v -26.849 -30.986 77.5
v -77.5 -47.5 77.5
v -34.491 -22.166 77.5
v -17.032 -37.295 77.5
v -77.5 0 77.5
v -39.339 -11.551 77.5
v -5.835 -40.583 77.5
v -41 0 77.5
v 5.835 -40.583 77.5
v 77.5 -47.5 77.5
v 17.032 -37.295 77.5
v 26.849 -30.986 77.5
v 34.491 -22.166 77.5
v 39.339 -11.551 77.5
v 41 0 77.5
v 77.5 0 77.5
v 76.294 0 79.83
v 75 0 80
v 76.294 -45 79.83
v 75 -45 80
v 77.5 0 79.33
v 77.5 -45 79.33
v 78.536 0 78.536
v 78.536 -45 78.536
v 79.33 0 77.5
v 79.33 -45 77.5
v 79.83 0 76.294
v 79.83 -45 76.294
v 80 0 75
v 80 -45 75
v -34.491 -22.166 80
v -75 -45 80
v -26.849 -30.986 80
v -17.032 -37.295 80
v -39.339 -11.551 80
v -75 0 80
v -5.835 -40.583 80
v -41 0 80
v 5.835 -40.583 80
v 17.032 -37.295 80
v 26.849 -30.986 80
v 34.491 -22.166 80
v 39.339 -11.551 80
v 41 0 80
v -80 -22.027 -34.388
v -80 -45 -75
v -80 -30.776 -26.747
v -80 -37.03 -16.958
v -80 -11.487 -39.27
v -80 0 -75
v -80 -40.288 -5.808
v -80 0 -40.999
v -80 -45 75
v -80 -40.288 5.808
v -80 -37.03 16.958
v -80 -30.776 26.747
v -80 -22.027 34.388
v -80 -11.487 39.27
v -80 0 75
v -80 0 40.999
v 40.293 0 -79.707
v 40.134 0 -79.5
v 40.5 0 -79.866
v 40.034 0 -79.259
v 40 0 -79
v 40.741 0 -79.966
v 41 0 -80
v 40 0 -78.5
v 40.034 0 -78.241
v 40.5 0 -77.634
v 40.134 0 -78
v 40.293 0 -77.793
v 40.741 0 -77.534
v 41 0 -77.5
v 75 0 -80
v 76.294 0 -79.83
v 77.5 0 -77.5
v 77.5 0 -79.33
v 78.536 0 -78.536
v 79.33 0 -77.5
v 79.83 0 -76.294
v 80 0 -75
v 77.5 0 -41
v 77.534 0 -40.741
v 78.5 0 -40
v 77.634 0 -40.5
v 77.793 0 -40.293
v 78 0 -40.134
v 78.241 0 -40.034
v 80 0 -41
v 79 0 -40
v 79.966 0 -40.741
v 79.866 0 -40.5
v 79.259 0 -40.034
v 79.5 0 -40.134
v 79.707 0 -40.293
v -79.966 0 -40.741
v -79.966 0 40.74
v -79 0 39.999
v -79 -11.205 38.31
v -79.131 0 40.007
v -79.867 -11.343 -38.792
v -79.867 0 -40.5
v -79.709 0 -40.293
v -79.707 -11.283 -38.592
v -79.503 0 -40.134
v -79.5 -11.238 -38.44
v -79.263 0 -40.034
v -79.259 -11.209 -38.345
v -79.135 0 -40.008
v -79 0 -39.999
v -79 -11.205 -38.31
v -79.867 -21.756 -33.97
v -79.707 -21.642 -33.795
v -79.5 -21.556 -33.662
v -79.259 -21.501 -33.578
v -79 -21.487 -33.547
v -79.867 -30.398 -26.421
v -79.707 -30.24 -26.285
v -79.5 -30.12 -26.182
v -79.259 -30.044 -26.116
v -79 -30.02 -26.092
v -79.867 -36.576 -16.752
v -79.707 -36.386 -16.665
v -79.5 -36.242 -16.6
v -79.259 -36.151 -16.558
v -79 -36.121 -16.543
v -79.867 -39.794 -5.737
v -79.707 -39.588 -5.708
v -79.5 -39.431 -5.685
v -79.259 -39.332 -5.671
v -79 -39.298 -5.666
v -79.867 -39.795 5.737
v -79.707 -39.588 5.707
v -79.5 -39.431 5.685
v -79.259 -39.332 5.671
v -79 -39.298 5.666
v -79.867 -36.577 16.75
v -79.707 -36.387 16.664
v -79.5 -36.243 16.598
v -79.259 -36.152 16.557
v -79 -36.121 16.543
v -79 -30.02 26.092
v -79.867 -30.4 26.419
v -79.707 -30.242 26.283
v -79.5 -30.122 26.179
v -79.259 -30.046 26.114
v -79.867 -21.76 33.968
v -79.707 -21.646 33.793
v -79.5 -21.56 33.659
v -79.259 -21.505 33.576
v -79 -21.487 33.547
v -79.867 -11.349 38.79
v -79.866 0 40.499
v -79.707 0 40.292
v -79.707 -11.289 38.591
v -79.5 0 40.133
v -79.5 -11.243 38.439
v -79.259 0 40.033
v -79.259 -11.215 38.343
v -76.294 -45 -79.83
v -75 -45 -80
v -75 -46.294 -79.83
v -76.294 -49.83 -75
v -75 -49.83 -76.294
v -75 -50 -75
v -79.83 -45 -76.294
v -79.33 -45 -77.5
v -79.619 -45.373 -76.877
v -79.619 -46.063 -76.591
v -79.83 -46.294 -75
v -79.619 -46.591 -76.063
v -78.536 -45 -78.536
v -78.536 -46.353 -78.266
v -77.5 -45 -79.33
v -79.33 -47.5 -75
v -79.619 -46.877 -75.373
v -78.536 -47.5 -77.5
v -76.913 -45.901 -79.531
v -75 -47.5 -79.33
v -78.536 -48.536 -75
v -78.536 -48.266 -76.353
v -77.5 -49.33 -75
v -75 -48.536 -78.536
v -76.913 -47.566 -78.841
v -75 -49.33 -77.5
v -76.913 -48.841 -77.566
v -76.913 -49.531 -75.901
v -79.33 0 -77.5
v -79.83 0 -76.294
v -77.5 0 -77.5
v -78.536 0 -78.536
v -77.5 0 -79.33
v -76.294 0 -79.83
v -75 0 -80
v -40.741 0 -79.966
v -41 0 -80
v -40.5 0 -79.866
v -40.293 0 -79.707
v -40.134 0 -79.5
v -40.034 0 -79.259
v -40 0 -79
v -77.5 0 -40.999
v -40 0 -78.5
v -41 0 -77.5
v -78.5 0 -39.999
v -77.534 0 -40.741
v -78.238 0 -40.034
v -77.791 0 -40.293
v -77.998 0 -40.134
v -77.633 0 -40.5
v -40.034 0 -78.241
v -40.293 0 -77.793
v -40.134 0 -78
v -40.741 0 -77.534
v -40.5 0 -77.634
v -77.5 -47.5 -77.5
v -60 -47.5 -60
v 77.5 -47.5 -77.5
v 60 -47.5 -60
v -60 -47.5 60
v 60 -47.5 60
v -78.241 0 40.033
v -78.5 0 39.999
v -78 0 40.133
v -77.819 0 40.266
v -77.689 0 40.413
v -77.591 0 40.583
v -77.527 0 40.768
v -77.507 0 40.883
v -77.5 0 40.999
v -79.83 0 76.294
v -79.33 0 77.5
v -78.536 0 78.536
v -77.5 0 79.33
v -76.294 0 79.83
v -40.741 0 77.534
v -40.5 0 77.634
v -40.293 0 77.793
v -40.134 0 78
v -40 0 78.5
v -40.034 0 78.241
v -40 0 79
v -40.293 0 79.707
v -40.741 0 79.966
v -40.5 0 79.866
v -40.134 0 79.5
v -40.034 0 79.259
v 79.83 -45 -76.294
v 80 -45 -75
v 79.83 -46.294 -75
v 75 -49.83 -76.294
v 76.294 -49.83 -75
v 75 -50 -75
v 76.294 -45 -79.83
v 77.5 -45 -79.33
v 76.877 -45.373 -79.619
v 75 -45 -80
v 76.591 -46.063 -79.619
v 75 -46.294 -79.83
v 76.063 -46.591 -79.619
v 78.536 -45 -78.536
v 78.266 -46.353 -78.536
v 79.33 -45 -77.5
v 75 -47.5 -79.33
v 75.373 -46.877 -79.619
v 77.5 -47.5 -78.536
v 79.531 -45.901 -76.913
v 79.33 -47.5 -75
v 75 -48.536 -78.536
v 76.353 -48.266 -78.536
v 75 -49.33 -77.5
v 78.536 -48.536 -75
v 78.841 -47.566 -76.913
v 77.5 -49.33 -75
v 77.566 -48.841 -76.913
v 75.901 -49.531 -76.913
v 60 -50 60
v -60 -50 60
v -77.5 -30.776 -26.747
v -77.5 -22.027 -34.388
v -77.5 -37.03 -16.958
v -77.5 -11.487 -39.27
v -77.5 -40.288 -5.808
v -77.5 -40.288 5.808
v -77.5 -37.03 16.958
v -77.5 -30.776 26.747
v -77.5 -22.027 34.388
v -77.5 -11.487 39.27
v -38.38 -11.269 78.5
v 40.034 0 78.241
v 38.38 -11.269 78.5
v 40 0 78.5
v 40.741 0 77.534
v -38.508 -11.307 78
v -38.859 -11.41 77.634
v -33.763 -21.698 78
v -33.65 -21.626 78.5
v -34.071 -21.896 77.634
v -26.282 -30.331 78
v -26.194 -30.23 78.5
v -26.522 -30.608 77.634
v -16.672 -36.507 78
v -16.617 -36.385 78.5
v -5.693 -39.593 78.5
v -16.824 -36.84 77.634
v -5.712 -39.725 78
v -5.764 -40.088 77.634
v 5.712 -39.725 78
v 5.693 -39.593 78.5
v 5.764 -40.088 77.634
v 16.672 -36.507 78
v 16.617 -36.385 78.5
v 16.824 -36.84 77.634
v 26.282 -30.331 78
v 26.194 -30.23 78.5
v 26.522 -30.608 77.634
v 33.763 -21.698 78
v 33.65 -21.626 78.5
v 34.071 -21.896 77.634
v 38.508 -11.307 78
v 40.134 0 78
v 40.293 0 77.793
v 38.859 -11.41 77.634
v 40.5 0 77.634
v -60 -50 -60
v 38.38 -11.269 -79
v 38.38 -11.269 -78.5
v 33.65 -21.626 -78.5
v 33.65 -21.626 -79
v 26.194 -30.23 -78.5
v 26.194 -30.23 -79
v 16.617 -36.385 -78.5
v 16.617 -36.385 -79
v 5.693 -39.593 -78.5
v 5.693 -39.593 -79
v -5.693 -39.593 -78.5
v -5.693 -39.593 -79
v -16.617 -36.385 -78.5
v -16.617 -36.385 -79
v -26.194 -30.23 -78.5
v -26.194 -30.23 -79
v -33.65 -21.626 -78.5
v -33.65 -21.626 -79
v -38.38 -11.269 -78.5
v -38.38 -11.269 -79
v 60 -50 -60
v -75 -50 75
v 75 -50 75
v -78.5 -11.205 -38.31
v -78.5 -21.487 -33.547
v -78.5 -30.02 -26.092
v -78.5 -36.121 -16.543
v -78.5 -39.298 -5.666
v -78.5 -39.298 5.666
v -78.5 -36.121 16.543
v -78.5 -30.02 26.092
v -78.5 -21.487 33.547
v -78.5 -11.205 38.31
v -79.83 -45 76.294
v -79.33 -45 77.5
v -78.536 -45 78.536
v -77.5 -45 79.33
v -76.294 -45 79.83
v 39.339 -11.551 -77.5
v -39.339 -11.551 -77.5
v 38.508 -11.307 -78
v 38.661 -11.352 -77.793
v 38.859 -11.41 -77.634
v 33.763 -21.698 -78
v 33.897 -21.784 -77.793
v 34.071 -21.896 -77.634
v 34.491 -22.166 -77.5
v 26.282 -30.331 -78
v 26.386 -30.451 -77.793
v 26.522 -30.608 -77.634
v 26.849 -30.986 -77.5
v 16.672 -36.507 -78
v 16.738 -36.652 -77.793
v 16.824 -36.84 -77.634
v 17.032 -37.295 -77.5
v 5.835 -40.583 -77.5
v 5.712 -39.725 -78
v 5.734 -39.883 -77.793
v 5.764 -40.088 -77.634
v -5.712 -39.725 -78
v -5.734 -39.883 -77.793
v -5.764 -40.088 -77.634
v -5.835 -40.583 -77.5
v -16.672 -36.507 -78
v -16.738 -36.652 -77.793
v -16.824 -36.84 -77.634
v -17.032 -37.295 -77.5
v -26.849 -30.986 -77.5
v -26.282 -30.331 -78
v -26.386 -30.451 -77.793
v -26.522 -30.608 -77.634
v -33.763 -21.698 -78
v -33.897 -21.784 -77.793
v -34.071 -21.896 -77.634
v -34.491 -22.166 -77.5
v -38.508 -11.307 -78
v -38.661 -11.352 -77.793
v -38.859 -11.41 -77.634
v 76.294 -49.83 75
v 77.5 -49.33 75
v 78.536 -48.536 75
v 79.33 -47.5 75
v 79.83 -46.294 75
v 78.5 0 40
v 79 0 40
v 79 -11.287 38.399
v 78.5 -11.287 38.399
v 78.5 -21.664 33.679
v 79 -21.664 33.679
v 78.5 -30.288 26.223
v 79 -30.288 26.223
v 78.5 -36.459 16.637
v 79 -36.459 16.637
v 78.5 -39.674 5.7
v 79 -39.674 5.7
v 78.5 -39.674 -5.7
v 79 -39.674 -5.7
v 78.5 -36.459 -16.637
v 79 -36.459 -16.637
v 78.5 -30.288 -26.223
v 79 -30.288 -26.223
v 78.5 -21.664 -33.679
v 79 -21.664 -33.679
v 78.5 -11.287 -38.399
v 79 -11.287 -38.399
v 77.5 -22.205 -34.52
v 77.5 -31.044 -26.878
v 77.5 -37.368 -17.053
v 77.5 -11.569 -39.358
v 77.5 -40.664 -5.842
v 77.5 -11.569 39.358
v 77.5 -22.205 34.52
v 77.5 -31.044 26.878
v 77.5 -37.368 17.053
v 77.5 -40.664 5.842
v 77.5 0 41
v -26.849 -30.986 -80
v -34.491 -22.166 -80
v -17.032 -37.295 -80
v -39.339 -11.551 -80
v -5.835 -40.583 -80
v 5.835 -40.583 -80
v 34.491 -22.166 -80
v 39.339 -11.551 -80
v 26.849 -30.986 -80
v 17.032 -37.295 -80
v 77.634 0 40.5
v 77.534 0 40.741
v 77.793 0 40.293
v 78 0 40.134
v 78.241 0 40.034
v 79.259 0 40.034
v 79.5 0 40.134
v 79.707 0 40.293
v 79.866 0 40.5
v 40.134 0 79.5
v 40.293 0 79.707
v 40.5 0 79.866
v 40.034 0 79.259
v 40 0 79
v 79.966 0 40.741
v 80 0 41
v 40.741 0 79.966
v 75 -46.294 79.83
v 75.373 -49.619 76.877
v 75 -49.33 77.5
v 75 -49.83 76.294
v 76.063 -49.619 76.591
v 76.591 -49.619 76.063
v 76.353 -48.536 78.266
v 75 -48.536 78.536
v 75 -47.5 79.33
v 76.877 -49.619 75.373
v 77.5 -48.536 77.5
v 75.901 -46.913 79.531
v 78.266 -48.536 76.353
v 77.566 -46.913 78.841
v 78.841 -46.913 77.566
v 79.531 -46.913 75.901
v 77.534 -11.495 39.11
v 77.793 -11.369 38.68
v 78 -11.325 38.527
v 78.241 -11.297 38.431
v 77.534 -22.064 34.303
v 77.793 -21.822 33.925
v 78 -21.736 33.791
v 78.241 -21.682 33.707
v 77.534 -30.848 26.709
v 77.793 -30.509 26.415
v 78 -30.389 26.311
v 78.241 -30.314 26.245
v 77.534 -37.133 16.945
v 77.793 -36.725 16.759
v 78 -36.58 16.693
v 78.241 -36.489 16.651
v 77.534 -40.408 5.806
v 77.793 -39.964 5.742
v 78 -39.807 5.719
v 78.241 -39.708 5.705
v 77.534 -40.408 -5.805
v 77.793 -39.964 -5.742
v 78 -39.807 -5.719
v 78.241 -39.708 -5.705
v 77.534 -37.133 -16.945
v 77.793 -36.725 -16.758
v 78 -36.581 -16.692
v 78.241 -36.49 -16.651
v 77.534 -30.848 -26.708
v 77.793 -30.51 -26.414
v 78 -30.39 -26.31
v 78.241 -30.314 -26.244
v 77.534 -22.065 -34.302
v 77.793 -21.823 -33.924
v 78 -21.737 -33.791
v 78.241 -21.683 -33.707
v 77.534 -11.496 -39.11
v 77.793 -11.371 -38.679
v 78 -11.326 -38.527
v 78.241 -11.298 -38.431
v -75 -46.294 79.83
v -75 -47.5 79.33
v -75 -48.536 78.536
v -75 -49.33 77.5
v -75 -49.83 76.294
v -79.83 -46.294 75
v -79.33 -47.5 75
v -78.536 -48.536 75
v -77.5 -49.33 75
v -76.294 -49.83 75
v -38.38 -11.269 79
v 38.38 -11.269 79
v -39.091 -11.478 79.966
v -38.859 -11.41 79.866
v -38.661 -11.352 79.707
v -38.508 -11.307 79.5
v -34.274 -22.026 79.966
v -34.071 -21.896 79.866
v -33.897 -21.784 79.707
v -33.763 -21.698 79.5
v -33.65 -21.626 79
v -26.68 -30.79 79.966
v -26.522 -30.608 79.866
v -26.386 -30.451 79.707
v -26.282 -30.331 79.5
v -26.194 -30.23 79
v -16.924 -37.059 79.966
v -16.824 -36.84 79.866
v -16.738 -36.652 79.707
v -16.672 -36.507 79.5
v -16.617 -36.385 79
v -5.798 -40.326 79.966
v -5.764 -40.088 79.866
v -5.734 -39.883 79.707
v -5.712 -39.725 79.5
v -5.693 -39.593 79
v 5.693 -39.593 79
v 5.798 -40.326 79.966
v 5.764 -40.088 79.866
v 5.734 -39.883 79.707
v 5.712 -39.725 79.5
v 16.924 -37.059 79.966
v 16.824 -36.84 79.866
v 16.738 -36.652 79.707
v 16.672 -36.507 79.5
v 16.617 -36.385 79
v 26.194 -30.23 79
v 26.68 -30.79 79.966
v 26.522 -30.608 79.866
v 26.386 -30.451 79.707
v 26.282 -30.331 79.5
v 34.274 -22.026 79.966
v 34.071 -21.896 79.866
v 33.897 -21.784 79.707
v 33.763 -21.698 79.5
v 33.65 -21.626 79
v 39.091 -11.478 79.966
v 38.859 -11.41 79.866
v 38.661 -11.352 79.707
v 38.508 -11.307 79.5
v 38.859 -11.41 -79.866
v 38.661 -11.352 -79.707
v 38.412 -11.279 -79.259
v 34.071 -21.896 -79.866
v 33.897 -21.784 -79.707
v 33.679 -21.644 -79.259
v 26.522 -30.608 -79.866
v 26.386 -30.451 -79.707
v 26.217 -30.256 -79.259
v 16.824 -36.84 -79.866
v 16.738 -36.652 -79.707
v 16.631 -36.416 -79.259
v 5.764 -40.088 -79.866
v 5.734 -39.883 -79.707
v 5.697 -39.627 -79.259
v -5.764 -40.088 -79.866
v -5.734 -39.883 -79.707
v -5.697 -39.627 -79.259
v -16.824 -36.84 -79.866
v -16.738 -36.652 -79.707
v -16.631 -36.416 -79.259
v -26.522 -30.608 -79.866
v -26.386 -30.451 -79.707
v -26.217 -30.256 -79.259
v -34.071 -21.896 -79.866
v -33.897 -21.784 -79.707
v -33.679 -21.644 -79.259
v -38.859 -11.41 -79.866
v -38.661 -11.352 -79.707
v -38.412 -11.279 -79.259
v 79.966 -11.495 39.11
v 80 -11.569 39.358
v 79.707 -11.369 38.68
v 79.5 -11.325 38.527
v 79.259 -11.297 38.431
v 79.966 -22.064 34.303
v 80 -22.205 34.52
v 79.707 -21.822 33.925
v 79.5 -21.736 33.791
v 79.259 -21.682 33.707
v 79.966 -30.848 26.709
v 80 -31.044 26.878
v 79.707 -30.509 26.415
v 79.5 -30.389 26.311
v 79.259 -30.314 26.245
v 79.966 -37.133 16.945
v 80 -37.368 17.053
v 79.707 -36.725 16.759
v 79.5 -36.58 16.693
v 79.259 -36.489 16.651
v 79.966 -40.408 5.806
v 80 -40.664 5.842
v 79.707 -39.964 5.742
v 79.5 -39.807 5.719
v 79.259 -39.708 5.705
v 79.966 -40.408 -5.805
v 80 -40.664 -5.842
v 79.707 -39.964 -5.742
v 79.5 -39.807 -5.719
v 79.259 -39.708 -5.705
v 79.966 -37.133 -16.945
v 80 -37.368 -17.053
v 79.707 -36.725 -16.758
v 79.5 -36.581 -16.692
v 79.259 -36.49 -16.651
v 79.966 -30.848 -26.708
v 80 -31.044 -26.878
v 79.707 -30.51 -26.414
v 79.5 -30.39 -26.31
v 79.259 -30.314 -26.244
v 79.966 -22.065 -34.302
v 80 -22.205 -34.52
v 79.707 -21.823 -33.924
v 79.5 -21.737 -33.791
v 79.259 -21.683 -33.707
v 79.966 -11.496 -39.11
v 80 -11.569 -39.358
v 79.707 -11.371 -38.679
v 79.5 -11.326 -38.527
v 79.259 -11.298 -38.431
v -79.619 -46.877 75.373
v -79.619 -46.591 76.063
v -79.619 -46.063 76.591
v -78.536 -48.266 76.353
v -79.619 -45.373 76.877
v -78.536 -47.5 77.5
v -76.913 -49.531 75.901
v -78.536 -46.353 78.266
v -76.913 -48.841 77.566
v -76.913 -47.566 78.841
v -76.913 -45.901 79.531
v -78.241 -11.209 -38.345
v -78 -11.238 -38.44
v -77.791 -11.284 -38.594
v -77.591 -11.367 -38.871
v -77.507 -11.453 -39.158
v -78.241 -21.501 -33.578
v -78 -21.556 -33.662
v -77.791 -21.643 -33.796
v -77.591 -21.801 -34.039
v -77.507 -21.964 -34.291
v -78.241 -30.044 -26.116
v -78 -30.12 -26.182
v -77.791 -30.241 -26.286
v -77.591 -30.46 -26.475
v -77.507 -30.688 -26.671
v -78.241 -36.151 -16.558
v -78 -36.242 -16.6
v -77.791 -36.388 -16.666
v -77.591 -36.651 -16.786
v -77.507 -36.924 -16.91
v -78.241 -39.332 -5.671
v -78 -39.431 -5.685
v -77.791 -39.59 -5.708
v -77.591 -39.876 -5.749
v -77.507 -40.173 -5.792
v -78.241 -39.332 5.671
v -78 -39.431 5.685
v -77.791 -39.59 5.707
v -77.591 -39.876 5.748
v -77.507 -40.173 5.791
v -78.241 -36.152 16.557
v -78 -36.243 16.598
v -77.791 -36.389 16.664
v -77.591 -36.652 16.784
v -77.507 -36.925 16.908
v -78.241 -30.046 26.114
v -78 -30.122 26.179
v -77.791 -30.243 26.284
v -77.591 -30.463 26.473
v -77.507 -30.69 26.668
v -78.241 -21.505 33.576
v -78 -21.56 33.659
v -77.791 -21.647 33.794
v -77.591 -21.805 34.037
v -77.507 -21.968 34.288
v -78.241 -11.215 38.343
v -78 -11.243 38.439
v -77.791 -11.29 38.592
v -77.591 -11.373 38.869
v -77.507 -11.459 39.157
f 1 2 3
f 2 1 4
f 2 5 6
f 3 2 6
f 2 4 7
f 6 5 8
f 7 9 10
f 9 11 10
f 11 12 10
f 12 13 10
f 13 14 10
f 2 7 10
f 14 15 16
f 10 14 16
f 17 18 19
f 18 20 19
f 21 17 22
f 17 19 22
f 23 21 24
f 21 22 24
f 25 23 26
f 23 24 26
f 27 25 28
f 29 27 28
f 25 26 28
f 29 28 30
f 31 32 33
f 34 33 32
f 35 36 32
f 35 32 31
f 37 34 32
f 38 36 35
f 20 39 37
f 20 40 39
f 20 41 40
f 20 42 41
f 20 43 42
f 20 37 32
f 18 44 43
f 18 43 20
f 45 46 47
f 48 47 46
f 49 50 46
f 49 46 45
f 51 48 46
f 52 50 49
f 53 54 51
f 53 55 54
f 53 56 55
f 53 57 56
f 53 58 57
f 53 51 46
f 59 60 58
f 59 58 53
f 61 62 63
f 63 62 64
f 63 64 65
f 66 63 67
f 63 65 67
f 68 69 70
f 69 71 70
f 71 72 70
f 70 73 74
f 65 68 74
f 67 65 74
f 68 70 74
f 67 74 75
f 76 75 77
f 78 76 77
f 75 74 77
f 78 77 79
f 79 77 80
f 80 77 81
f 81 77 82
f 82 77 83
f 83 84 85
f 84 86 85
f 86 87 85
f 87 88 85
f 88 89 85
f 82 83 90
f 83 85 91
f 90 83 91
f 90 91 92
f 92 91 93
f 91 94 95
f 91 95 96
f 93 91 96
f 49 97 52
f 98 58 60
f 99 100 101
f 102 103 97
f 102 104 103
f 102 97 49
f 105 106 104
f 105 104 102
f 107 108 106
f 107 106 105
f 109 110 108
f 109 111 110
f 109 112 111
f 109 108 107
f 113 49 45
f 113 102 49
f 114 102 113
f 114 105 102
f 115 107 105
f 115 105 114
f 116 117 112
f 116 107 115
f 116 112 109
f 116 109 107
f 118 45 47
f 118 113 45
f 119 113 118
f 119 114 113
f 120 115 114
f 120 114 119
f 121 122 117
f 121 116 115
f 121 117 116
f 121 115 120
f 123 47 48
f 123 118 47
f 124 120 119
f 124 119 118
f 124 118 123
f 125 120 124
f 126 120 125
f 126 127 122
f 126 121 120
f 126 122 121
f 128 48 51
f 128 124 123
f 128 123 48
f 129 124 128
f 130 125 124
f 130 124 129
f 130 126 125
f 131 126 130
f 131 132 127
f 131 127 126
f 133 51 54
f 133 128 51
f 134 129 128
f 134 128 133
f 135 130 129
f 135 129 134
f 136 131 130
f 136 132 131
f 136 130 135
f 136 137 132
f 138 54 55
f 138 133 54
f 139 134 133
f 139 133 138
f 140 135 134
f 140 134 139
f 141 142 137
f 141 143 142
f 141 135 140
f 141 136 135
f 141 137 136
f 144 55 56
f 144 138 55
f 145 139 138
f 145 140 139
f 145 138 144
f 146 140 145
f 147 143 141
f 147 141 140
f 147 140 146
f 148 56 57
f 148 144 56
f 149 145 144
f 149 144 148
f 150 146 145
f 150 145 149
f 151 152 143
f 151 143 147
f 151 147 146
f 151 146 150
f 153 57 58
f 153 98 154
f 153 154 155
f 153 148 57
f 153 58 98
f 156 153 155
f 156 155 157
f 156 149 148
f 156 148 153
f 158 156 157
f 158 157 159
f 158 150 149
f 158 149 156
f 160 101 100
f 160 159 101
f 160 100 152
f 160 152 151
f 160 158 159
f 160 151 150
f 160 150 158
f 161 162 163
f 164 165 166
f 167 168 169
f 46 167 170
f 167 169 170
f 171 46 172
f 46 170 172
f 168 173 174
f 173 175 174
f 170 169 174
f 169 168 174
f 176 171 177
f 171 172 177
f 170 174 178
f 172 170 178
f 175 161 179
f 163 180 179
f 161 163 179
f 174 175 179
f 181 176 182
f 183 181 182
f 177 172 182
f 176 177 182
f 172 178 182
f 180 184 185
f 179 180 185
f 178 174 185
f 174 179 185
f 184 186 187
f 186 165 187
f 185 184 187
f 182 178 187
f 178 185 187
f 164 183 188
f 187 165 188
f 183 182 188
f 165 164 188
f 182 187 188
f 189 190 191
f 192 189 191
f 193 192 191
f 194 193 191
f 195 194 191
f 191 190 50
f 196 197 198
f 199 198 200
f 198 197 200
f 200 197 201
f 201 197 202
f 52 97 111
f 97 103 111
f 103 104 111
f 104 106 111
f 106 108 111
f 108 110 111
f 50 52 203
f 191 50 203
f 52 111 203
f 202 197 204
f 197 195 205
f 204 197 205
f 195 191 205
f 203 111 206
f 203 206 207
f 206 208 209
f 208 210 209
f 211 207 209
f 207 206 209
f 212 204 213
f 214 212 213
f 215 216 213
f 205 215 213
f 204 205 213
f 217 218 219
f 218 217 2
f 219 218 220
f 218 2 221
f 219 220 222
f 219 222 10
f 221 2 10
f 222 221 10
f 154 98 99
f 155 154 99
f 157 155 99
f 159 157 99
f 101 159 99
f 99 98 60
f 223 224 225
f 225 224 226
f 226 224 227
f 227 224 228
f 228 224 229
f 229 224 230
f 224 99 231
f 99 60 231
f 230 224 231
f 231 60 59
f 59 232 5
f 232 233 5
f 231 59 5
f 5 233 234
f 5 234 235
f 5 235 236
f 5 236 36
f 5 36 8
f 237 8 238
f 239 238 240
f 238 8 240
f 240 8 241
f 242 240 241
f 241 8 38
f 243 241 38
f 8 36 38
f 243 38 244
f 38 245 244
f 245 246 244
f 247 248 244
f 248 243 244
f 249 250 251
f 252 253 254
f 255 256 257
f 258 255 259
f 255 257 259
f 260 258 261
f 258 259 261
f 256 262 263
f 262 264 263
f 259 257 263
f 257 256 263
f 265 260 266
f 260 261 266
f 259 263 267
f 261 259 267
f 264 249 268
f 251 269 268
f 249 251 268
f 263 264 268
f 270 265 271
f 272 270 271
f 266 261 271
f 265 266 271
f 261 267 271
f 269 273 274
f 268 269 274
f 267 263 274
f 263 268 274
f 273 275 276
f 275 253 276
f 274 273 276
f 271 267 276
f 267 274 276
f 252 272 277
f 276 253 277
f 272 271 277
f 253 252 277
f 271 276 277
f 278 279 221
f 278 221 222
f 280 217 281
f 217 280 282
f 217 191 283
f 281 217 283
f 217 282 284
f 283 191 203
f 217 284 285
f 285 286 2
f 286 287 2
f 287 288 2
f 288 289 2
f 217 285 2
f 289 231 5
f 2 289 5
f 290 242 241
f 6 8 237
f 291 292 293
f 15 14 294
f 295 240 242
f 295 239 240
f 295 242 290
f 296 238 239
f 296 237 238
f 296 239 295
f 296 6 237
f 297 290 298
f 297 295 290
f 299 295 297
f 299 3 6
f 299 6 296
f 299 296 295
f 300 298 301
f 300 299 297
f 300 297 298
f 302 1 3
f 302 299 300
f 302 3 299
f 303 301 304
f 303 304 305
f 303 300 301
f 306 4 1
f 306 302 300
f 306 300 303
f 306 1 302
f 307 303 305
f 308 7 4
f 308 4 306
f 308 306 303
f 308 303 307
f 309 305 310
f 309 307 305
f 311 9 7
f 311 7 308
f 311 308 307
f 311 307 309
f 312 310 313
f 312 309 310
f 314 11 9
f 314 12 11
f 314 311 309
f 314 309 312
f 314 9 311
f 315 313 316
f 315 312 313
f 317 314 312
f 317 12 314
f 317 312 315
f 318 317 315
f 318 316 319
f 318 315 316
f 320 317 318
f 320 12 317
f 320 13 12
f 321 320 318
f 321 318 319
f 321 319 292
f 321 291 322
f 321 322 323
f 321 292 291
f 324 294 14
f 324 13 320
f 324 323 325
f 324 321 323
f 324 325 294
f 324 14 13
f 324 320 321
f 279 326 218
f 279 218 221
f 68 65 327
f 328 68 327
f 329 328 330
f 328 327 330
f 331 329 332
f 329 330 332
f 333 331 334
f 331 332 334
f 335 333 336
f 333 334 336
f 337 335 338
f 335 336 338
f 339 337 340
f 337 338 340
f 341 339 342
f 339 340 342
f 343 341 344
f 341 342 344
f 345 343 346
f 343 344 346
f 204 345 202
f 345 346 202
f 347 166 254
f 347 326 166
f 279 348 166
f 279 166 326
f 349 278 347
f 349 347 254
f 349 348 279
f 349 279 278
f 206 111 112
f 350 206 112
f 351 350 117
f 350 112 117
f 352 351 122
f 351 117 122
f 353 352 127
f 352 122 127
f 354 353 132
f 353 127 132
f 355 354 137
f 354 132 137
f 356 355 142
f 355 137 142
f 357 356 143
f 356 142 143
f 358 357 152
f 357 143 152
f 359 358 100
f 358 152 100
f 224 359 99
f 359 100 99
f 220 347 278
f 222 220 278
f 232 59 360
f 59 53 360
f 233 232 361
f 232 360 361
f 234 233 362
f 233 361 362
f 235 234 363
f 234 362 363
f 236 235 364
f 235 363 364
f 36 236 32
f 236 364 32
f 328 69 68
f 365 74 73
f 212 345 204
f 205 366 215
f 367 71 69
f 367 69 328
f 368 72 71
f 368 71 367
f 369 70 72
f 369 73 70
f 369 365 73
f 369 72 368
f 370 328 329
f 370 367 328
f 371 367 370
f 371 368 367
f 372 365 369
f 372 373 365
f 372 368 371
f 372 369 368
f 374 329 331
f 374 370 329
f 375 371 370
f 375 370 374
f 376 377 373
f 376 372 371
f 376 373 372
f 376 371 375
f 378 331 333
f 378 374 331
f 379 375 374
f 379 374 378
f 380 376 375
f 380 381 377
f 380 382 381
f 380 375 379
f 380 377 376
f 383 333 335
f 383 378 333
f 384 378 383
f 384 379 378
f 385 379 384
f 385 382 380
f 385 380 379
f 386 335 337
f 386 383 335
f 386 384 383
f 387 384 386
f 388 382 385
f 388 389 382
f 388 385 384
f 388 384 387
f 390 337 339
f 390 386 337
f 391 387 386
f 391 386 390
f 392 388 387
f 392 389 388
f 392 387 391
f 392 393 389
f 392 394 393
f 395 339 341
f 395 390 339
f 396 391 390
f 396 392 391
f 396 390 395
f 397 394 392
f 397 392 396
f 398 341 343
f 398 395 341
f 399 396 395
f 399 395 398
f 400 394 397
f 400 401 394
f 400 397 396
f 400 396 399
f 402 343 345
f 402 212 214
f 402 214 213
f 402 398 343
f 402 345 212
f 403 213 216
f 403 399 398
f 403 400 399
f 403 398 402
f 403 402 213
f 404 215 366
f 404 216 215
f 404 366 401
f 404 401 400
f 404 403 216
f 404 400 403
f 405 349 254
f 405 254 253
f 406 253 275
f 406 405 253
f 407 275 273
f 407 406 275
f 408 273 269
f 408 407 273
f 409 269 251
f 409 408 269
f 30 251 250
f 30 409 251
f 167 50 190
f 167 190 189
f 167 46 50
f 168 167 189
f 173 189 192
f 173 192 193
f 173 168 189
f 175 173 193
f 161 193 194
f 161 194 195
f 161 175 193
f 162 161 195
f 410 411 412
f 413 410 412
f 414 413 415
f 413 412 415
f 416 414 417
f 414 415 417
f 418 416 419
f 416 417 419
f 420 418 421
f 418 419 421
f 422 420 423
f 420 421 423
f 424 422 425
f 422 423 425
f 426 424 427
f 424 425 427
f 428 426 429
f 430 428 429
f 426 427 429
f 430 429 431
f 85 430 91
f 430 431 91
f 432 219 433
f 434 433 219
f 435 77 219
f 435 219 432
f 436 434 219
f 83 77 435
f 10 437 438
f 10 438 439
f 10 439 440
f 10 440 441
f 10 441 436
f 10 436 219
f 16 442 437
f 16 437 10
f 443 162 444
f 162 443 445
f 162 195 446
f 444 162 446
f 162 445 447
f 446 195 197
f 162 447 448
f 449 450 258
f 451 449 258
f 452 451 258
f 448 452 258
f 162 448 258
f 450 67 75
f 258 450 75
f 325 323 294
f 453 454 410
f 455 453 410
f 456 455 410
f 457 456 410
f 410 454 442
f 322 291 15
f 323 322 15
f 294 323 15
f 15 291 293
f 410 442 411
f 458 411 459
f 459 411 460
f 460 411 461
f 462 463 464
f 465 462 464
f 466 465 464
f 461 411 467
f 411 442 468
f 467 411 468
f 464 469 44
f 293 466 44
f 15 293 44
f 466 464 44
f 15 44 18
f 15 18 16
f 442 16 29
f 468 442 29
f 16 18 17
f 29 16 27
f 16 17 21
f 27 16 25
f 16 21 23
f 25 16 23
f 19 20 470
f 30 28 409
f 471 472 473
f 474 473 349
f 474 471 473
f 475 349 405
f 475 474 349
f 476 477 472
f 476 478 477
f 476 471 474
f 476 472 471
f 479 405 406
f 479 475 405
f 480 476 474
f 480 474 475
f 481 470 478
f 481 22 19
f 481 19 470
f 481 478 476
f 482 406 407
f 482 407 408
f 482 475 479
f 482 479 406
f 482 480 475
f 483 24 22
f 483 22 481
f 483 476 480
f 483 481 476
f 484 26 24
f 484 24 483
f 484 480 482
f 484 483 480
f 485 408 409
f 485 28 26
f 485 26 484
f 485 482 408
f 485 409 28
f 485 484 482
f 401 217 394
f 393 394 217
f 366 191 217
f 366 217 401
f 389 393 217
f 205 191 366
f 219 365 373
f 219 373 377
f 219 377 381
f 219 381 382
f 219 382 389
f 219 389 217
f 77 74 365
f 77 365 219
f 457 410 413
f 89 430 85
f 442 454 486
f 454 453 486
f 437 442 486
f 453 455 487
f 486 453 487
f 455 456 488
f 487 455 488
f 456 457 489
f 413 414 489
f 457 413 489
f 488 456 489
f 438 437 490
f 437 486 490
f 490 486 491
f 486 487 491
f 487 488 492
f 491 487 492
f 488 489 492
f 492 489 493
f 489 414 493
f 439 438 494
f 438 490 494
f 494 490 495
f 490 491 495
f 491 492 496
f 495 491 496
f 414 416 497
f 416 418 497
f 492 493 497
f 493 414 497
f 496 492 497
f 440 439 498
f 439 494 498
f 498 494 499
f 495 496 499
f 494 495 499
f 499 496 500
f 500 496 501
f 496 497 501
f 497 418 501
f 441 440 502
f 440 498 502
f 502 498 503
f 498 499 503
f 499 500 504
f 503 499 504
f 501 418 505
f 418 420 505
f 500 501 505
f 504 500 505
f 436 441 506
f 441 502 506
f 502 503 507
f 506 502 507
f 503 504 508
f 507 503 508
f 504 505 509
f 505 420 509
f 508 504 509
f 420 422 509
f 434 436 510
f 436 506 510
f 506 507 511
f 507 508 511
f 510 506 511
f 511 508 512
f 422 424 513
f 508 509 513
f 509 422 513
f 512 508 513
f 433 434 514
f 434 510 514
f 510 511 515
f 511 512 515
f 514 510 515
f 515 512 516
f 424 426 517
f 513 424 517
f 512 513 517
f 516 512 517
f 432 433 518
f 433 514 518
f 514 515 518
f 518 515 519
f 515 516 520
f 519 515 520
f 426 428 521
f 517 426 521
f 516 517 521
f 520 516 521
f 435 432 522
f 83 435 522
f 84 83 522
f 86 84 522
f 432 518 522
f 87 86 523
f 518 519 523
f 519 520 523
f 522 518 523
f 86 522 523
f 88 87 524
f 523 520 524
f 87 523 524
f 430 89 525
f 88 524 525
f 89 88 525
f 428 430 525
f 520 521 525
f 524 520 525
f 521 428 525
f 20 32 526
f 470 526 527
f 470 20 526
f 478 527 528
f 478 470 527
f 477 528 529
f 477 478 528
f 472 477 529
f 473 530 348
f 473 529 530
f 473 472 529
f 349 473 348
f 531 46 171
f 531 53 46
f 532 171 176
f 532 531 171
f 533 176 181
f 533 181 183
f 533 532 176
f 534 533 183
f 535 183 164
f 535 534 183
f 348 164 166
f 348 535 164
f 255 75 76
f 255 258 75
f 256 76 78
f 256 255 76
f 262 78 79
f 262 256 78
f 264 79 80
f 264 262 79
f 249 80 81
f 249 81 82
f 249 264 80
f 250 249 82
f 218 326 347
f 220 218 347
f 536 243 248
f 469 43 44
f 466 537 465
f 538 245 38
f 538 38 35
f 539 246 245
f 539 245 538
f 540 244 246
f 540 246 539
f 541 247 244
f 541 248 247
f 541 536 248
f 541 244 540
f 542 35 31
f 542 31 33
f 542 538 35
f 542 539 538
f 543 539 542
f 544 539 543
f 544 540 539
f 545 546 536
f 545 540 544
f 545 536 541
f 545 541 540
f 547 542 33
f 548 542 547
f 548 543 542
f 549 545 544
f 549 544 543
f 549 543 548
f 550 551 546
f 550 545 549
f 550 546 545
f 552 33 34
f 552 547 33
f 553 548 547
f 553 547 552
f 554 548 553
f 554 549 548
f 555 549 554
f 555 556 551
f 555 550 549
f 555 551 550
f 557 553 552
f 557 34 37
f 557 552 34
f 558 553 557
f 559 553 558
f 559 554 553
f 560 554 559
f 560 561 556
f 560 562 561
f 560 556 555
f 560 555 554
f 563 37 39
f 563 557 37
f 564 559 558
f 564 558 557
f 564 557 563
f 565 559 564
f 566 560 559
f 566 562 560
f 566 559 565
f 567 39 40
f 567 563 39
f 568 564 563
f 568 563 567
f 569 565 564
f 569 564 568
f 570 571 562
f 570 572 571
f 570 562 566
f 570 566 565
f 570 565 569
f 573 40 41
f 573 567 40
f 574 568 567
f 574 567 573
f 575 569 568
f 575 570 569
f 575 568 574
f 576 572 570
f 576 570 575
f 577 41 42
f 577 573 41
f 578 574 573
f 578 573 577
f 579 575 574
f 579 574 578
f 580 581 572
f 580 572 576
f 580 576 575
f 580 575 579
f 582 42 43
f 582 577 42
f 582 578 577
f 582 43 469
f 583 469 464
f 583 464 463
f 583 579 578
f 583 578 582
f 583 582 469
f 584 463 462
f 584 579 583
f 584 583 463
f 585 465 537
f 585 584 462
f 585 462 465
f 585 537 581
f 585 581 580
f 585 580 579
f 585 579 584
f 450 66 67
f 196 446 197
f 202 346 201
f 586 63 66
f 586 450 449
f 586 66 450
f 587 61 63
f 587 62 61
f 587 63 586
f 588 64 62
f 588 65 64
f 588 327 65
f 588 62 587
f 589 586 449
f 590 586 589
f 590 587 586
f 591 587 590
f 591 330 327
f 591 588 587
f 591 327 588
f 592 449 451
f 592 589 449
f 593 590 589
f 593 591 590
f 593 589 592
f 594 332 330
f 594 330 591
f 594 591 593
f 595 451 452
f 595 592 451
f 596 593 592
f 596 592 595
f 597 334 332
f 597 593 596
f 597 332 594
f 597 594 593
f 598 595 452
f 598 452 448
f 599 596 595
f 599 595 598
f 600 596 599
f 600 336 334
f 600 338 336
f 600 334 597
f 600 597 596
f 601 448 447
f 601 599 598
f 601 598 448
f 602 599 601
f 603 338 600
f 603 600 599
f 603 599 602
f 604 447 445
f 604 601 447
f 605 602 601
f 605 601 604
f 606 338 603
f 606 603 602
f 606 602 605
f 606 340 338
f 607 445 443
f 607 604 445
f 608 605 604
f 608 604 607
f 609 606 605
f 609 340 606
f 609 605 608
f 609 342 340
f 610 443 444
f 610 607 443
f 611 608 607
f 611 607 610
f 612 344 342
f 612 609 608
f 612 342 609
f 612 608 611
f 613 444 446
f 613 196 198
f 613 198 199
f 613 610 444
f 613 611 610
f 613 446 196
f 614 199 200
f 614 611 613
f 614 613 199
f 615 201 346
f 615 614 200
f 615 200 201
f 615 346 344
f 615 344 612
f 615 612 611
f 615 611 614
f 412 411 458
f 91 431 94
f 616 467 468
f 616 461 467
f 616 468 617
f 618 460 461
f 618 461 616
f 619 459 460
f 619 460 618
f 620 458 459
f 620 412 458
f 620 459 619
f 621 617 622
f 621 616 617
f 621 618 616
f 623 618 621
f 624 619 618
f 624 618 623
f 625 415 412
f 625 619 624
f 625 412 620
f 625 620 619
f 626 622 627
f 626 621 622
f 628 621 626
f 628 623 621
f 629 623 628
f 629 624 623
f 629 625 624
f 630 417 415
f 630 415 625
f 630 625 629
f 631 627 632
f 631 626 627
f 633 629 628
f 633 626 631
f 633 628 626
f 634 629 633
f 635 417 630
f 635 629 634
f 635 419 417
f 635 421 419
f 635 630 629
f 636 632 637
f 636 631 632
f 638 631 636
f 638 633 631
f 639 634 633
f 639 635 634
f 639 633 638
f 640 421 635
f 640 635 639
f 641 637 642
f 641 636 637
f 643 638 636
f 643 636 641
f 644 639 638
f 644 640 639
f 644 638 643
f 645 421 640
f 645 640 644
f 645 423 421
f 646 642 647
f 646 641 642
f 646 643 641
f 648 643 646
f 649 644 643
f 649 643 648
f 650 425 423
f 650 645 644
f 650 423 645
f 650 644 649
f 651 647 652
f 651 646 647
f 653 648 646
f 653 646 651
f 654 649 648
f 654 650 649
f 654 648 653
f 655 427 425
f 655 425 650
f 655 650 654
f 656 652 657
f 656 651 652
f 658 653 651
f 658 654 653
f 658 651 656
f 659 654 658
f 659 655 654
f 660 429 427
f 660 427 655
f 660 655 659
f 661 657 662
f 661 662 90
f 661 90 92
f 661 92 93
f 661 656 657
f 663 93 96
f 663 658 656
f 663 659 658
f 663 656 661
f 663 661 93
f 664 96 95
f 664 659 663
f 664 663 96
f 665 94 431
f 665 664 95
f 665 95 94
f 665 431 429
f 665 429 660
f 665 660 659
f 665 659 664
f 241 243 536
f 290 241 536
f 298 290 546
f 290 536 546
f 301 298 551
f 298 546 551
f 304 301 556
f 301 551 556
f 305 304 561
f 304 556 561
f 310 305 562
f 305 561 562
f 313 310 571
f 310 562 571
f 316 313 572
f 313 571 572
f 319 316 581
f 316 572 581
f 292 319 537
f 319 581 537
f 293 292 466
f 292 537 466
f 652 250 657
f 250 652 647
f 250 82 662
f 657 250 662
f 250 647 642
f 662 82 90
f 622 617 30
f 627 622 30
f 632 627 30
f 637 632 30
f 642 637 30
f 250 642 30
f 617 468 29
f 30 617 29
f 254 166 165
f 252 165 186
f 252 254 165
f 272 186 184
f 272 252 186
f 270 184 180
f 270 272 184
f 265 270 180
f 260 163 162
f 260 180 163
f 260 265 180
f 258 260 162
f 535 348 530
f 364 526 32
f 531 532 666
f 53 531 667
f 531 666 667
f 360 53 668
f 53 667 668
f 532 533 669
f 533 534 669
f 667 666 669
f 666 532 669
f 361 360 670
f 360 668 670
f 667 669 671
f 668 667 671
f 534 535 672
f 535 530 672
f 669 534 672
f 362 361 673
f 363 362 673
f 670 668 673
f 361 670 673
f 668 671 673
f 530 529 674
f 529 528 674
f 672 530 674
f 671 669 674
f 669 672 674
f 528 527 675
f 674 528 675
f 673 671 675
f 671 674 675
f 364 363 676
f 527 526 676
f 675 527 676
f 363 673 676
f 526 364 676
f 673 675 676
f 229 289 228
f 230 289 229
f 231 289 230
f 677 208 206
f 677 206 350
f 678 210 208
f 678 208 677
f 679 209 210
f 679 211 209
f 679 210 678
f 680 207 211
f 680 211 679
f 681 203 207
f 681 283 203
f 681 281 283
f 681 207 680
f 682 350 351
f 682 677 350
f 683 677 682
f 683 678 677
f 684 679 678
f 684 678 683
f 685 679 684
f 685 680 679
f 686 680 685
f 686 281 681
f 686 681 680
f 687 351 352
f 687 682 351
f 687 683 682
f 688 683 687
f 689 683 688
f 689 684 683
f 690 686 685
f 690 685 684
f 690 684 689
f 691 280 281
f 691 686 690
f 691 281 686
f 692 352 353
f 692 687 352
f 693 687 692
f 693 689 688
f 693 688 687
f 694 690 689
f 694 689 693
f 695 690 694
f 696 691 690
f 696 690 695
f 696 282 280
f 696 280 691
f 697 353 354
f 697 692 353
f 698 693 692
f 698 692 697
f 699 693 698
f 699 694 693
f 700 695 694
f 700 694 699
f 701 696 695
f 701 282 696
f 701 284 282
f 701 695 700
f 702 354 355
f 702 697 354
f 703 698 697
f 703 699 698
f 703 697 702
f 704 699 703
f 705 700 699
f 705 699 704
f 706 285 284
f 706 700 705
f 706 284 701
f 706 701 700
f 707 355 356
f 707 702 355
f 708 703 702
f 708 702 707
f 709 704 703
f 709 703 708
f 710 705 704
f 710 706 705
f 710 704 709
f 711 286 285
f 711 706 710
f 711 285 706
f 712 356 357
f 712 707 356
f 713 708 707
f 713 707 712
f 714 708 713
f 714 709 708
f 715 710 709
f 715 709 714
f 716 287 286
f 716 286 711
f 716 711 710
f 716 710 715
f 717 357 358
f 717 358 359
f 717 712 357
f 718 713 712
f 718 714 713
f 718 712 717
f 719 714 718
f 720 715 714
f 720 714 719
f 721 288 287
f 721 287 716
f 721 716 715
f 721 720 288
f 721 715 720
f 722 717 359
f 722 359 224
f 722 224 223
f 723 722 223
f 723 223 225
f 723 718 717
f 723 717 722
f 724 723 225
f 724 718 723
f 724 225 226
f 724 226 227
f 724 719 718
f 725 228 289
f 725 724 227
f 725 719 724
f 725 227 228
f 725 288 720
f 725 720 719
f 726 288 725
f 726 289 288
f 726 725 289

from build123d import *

# Parameters (mm, degrees)
F0_W      = 160
F0_H      = 160
F1_DEPTH  = 50
F2_T      = -2.5
F4_DEPTH  = 25
F6_DEPTH  = 25
F8_DEPTH  = 25
F10_DEPTH = 25
F11_W     = 120
F11_H     = 120
F12_DEPTH = 25
F13_R     = 5
F14_R     = 1


with BuildPart() as f1:
    # F0 (on Front) → F1 (new body)
    with BuildSketch(Plane.XZ):
        Rectangle(F0_W, F0_H)
    extrude(amount=F1_DEPTH)

    # F2
    f2_openings = [f1.faces().sort_by_distance(p)[0] for p in [
        (0, 0, 0),
    ]]
    offset(amount=F2_T, openings=f2_openings)

    # F3 (on face) → F4 (cut)
    with BuildSketch(Plane(origin=(0, 0, -80), x_dir=(1, 0, 0), z_dir=(0, 0, -1))):
        with BuildLine():
            Line((-40, 0), (40, 0))
            ThreePointArc((40, 0), (0, 40), (-40, 0))
        make_face()
    extrude(amount=-F4_DEPTH, mode=Mode.SUBTRACT)

    # F5 (on face) → F6 (cut)
    with BuildSketch(Plane(origin=(-80, 0, 0), x_dir=(0, -1, 0), z_dir=(-1, 0, 0))):
        with BuildLine():
            Line((0, 39.9988864115), (0, -39.9988864115))
            ThreePointArc((0, -39.9988864115), (39.7015274931, 0), (0, 39.9988864115))
        make_face()
    extrude(amount=-F6_DEPTH, mode=Mode.SUBTRACT)

    # F7 (on face) → F8 (cut)
    with BuildSketch(Plane.XY.offset(80)):
        with BuildLine():
            Line((40, 0), (-40, 0))
            ThreePointArc((-40, 0), (0, -40), (40, 0))
        make_face()
    extrude(amount=-F8_DEPTH, mode=Mode.SUBTRACT)

    # F9 (on face) → F10 (cut)
    with BuildSketch(Plane.YZ.offset(80)):
        with BuildLine():
            Line((0, -39.999914752), (0, 39.999914752))
            ThreePointArc((0, 39.999914752), (-40.0825822808, 0), (0, -39.999914752))
        make_face()
    extrude(amount=-F10_DEPTH, mode=Mode.SUBTRACT)

    # F11 (on face) → F12 (cut)
    with BuildSketch(Plane.XZ.offset(50)):
        Rectangle(F11_W, F11_H)
    extrude(amount=-F12_DEPTH, mode=Mode.SUBTRACT)

    # F13
    f13_edges = [f1.edges().sort_by_distance(p)[0] for p in [
        (80, -25, 80),
        (0, -50, 80),
        (80, -50, 0),
        (80, -25, -80),
        (0, -50, -80),
        (-80, -25, -80),
        (-80, -50, 0),
        (-80, -25, 80),
    ]]
    fillet(f13_edges, radius=F13_R)

    # F14
    f14_edges = [f1.edges().sort_by_distance(p)[0] for p in [
        (0, -40, -77.5),
        (0, -40, -80),
        (77.5, -40.082582, 0),
        (80, -40.082582, 0),
        (0, -40, 77.5),
        (0, -40, 80),
        (-77.5, -39.701527, 0),
        (-80, -39.701527, 0),
    ]]
    fillet(f14_edges, radius=F14_R)


solid = f1.part
